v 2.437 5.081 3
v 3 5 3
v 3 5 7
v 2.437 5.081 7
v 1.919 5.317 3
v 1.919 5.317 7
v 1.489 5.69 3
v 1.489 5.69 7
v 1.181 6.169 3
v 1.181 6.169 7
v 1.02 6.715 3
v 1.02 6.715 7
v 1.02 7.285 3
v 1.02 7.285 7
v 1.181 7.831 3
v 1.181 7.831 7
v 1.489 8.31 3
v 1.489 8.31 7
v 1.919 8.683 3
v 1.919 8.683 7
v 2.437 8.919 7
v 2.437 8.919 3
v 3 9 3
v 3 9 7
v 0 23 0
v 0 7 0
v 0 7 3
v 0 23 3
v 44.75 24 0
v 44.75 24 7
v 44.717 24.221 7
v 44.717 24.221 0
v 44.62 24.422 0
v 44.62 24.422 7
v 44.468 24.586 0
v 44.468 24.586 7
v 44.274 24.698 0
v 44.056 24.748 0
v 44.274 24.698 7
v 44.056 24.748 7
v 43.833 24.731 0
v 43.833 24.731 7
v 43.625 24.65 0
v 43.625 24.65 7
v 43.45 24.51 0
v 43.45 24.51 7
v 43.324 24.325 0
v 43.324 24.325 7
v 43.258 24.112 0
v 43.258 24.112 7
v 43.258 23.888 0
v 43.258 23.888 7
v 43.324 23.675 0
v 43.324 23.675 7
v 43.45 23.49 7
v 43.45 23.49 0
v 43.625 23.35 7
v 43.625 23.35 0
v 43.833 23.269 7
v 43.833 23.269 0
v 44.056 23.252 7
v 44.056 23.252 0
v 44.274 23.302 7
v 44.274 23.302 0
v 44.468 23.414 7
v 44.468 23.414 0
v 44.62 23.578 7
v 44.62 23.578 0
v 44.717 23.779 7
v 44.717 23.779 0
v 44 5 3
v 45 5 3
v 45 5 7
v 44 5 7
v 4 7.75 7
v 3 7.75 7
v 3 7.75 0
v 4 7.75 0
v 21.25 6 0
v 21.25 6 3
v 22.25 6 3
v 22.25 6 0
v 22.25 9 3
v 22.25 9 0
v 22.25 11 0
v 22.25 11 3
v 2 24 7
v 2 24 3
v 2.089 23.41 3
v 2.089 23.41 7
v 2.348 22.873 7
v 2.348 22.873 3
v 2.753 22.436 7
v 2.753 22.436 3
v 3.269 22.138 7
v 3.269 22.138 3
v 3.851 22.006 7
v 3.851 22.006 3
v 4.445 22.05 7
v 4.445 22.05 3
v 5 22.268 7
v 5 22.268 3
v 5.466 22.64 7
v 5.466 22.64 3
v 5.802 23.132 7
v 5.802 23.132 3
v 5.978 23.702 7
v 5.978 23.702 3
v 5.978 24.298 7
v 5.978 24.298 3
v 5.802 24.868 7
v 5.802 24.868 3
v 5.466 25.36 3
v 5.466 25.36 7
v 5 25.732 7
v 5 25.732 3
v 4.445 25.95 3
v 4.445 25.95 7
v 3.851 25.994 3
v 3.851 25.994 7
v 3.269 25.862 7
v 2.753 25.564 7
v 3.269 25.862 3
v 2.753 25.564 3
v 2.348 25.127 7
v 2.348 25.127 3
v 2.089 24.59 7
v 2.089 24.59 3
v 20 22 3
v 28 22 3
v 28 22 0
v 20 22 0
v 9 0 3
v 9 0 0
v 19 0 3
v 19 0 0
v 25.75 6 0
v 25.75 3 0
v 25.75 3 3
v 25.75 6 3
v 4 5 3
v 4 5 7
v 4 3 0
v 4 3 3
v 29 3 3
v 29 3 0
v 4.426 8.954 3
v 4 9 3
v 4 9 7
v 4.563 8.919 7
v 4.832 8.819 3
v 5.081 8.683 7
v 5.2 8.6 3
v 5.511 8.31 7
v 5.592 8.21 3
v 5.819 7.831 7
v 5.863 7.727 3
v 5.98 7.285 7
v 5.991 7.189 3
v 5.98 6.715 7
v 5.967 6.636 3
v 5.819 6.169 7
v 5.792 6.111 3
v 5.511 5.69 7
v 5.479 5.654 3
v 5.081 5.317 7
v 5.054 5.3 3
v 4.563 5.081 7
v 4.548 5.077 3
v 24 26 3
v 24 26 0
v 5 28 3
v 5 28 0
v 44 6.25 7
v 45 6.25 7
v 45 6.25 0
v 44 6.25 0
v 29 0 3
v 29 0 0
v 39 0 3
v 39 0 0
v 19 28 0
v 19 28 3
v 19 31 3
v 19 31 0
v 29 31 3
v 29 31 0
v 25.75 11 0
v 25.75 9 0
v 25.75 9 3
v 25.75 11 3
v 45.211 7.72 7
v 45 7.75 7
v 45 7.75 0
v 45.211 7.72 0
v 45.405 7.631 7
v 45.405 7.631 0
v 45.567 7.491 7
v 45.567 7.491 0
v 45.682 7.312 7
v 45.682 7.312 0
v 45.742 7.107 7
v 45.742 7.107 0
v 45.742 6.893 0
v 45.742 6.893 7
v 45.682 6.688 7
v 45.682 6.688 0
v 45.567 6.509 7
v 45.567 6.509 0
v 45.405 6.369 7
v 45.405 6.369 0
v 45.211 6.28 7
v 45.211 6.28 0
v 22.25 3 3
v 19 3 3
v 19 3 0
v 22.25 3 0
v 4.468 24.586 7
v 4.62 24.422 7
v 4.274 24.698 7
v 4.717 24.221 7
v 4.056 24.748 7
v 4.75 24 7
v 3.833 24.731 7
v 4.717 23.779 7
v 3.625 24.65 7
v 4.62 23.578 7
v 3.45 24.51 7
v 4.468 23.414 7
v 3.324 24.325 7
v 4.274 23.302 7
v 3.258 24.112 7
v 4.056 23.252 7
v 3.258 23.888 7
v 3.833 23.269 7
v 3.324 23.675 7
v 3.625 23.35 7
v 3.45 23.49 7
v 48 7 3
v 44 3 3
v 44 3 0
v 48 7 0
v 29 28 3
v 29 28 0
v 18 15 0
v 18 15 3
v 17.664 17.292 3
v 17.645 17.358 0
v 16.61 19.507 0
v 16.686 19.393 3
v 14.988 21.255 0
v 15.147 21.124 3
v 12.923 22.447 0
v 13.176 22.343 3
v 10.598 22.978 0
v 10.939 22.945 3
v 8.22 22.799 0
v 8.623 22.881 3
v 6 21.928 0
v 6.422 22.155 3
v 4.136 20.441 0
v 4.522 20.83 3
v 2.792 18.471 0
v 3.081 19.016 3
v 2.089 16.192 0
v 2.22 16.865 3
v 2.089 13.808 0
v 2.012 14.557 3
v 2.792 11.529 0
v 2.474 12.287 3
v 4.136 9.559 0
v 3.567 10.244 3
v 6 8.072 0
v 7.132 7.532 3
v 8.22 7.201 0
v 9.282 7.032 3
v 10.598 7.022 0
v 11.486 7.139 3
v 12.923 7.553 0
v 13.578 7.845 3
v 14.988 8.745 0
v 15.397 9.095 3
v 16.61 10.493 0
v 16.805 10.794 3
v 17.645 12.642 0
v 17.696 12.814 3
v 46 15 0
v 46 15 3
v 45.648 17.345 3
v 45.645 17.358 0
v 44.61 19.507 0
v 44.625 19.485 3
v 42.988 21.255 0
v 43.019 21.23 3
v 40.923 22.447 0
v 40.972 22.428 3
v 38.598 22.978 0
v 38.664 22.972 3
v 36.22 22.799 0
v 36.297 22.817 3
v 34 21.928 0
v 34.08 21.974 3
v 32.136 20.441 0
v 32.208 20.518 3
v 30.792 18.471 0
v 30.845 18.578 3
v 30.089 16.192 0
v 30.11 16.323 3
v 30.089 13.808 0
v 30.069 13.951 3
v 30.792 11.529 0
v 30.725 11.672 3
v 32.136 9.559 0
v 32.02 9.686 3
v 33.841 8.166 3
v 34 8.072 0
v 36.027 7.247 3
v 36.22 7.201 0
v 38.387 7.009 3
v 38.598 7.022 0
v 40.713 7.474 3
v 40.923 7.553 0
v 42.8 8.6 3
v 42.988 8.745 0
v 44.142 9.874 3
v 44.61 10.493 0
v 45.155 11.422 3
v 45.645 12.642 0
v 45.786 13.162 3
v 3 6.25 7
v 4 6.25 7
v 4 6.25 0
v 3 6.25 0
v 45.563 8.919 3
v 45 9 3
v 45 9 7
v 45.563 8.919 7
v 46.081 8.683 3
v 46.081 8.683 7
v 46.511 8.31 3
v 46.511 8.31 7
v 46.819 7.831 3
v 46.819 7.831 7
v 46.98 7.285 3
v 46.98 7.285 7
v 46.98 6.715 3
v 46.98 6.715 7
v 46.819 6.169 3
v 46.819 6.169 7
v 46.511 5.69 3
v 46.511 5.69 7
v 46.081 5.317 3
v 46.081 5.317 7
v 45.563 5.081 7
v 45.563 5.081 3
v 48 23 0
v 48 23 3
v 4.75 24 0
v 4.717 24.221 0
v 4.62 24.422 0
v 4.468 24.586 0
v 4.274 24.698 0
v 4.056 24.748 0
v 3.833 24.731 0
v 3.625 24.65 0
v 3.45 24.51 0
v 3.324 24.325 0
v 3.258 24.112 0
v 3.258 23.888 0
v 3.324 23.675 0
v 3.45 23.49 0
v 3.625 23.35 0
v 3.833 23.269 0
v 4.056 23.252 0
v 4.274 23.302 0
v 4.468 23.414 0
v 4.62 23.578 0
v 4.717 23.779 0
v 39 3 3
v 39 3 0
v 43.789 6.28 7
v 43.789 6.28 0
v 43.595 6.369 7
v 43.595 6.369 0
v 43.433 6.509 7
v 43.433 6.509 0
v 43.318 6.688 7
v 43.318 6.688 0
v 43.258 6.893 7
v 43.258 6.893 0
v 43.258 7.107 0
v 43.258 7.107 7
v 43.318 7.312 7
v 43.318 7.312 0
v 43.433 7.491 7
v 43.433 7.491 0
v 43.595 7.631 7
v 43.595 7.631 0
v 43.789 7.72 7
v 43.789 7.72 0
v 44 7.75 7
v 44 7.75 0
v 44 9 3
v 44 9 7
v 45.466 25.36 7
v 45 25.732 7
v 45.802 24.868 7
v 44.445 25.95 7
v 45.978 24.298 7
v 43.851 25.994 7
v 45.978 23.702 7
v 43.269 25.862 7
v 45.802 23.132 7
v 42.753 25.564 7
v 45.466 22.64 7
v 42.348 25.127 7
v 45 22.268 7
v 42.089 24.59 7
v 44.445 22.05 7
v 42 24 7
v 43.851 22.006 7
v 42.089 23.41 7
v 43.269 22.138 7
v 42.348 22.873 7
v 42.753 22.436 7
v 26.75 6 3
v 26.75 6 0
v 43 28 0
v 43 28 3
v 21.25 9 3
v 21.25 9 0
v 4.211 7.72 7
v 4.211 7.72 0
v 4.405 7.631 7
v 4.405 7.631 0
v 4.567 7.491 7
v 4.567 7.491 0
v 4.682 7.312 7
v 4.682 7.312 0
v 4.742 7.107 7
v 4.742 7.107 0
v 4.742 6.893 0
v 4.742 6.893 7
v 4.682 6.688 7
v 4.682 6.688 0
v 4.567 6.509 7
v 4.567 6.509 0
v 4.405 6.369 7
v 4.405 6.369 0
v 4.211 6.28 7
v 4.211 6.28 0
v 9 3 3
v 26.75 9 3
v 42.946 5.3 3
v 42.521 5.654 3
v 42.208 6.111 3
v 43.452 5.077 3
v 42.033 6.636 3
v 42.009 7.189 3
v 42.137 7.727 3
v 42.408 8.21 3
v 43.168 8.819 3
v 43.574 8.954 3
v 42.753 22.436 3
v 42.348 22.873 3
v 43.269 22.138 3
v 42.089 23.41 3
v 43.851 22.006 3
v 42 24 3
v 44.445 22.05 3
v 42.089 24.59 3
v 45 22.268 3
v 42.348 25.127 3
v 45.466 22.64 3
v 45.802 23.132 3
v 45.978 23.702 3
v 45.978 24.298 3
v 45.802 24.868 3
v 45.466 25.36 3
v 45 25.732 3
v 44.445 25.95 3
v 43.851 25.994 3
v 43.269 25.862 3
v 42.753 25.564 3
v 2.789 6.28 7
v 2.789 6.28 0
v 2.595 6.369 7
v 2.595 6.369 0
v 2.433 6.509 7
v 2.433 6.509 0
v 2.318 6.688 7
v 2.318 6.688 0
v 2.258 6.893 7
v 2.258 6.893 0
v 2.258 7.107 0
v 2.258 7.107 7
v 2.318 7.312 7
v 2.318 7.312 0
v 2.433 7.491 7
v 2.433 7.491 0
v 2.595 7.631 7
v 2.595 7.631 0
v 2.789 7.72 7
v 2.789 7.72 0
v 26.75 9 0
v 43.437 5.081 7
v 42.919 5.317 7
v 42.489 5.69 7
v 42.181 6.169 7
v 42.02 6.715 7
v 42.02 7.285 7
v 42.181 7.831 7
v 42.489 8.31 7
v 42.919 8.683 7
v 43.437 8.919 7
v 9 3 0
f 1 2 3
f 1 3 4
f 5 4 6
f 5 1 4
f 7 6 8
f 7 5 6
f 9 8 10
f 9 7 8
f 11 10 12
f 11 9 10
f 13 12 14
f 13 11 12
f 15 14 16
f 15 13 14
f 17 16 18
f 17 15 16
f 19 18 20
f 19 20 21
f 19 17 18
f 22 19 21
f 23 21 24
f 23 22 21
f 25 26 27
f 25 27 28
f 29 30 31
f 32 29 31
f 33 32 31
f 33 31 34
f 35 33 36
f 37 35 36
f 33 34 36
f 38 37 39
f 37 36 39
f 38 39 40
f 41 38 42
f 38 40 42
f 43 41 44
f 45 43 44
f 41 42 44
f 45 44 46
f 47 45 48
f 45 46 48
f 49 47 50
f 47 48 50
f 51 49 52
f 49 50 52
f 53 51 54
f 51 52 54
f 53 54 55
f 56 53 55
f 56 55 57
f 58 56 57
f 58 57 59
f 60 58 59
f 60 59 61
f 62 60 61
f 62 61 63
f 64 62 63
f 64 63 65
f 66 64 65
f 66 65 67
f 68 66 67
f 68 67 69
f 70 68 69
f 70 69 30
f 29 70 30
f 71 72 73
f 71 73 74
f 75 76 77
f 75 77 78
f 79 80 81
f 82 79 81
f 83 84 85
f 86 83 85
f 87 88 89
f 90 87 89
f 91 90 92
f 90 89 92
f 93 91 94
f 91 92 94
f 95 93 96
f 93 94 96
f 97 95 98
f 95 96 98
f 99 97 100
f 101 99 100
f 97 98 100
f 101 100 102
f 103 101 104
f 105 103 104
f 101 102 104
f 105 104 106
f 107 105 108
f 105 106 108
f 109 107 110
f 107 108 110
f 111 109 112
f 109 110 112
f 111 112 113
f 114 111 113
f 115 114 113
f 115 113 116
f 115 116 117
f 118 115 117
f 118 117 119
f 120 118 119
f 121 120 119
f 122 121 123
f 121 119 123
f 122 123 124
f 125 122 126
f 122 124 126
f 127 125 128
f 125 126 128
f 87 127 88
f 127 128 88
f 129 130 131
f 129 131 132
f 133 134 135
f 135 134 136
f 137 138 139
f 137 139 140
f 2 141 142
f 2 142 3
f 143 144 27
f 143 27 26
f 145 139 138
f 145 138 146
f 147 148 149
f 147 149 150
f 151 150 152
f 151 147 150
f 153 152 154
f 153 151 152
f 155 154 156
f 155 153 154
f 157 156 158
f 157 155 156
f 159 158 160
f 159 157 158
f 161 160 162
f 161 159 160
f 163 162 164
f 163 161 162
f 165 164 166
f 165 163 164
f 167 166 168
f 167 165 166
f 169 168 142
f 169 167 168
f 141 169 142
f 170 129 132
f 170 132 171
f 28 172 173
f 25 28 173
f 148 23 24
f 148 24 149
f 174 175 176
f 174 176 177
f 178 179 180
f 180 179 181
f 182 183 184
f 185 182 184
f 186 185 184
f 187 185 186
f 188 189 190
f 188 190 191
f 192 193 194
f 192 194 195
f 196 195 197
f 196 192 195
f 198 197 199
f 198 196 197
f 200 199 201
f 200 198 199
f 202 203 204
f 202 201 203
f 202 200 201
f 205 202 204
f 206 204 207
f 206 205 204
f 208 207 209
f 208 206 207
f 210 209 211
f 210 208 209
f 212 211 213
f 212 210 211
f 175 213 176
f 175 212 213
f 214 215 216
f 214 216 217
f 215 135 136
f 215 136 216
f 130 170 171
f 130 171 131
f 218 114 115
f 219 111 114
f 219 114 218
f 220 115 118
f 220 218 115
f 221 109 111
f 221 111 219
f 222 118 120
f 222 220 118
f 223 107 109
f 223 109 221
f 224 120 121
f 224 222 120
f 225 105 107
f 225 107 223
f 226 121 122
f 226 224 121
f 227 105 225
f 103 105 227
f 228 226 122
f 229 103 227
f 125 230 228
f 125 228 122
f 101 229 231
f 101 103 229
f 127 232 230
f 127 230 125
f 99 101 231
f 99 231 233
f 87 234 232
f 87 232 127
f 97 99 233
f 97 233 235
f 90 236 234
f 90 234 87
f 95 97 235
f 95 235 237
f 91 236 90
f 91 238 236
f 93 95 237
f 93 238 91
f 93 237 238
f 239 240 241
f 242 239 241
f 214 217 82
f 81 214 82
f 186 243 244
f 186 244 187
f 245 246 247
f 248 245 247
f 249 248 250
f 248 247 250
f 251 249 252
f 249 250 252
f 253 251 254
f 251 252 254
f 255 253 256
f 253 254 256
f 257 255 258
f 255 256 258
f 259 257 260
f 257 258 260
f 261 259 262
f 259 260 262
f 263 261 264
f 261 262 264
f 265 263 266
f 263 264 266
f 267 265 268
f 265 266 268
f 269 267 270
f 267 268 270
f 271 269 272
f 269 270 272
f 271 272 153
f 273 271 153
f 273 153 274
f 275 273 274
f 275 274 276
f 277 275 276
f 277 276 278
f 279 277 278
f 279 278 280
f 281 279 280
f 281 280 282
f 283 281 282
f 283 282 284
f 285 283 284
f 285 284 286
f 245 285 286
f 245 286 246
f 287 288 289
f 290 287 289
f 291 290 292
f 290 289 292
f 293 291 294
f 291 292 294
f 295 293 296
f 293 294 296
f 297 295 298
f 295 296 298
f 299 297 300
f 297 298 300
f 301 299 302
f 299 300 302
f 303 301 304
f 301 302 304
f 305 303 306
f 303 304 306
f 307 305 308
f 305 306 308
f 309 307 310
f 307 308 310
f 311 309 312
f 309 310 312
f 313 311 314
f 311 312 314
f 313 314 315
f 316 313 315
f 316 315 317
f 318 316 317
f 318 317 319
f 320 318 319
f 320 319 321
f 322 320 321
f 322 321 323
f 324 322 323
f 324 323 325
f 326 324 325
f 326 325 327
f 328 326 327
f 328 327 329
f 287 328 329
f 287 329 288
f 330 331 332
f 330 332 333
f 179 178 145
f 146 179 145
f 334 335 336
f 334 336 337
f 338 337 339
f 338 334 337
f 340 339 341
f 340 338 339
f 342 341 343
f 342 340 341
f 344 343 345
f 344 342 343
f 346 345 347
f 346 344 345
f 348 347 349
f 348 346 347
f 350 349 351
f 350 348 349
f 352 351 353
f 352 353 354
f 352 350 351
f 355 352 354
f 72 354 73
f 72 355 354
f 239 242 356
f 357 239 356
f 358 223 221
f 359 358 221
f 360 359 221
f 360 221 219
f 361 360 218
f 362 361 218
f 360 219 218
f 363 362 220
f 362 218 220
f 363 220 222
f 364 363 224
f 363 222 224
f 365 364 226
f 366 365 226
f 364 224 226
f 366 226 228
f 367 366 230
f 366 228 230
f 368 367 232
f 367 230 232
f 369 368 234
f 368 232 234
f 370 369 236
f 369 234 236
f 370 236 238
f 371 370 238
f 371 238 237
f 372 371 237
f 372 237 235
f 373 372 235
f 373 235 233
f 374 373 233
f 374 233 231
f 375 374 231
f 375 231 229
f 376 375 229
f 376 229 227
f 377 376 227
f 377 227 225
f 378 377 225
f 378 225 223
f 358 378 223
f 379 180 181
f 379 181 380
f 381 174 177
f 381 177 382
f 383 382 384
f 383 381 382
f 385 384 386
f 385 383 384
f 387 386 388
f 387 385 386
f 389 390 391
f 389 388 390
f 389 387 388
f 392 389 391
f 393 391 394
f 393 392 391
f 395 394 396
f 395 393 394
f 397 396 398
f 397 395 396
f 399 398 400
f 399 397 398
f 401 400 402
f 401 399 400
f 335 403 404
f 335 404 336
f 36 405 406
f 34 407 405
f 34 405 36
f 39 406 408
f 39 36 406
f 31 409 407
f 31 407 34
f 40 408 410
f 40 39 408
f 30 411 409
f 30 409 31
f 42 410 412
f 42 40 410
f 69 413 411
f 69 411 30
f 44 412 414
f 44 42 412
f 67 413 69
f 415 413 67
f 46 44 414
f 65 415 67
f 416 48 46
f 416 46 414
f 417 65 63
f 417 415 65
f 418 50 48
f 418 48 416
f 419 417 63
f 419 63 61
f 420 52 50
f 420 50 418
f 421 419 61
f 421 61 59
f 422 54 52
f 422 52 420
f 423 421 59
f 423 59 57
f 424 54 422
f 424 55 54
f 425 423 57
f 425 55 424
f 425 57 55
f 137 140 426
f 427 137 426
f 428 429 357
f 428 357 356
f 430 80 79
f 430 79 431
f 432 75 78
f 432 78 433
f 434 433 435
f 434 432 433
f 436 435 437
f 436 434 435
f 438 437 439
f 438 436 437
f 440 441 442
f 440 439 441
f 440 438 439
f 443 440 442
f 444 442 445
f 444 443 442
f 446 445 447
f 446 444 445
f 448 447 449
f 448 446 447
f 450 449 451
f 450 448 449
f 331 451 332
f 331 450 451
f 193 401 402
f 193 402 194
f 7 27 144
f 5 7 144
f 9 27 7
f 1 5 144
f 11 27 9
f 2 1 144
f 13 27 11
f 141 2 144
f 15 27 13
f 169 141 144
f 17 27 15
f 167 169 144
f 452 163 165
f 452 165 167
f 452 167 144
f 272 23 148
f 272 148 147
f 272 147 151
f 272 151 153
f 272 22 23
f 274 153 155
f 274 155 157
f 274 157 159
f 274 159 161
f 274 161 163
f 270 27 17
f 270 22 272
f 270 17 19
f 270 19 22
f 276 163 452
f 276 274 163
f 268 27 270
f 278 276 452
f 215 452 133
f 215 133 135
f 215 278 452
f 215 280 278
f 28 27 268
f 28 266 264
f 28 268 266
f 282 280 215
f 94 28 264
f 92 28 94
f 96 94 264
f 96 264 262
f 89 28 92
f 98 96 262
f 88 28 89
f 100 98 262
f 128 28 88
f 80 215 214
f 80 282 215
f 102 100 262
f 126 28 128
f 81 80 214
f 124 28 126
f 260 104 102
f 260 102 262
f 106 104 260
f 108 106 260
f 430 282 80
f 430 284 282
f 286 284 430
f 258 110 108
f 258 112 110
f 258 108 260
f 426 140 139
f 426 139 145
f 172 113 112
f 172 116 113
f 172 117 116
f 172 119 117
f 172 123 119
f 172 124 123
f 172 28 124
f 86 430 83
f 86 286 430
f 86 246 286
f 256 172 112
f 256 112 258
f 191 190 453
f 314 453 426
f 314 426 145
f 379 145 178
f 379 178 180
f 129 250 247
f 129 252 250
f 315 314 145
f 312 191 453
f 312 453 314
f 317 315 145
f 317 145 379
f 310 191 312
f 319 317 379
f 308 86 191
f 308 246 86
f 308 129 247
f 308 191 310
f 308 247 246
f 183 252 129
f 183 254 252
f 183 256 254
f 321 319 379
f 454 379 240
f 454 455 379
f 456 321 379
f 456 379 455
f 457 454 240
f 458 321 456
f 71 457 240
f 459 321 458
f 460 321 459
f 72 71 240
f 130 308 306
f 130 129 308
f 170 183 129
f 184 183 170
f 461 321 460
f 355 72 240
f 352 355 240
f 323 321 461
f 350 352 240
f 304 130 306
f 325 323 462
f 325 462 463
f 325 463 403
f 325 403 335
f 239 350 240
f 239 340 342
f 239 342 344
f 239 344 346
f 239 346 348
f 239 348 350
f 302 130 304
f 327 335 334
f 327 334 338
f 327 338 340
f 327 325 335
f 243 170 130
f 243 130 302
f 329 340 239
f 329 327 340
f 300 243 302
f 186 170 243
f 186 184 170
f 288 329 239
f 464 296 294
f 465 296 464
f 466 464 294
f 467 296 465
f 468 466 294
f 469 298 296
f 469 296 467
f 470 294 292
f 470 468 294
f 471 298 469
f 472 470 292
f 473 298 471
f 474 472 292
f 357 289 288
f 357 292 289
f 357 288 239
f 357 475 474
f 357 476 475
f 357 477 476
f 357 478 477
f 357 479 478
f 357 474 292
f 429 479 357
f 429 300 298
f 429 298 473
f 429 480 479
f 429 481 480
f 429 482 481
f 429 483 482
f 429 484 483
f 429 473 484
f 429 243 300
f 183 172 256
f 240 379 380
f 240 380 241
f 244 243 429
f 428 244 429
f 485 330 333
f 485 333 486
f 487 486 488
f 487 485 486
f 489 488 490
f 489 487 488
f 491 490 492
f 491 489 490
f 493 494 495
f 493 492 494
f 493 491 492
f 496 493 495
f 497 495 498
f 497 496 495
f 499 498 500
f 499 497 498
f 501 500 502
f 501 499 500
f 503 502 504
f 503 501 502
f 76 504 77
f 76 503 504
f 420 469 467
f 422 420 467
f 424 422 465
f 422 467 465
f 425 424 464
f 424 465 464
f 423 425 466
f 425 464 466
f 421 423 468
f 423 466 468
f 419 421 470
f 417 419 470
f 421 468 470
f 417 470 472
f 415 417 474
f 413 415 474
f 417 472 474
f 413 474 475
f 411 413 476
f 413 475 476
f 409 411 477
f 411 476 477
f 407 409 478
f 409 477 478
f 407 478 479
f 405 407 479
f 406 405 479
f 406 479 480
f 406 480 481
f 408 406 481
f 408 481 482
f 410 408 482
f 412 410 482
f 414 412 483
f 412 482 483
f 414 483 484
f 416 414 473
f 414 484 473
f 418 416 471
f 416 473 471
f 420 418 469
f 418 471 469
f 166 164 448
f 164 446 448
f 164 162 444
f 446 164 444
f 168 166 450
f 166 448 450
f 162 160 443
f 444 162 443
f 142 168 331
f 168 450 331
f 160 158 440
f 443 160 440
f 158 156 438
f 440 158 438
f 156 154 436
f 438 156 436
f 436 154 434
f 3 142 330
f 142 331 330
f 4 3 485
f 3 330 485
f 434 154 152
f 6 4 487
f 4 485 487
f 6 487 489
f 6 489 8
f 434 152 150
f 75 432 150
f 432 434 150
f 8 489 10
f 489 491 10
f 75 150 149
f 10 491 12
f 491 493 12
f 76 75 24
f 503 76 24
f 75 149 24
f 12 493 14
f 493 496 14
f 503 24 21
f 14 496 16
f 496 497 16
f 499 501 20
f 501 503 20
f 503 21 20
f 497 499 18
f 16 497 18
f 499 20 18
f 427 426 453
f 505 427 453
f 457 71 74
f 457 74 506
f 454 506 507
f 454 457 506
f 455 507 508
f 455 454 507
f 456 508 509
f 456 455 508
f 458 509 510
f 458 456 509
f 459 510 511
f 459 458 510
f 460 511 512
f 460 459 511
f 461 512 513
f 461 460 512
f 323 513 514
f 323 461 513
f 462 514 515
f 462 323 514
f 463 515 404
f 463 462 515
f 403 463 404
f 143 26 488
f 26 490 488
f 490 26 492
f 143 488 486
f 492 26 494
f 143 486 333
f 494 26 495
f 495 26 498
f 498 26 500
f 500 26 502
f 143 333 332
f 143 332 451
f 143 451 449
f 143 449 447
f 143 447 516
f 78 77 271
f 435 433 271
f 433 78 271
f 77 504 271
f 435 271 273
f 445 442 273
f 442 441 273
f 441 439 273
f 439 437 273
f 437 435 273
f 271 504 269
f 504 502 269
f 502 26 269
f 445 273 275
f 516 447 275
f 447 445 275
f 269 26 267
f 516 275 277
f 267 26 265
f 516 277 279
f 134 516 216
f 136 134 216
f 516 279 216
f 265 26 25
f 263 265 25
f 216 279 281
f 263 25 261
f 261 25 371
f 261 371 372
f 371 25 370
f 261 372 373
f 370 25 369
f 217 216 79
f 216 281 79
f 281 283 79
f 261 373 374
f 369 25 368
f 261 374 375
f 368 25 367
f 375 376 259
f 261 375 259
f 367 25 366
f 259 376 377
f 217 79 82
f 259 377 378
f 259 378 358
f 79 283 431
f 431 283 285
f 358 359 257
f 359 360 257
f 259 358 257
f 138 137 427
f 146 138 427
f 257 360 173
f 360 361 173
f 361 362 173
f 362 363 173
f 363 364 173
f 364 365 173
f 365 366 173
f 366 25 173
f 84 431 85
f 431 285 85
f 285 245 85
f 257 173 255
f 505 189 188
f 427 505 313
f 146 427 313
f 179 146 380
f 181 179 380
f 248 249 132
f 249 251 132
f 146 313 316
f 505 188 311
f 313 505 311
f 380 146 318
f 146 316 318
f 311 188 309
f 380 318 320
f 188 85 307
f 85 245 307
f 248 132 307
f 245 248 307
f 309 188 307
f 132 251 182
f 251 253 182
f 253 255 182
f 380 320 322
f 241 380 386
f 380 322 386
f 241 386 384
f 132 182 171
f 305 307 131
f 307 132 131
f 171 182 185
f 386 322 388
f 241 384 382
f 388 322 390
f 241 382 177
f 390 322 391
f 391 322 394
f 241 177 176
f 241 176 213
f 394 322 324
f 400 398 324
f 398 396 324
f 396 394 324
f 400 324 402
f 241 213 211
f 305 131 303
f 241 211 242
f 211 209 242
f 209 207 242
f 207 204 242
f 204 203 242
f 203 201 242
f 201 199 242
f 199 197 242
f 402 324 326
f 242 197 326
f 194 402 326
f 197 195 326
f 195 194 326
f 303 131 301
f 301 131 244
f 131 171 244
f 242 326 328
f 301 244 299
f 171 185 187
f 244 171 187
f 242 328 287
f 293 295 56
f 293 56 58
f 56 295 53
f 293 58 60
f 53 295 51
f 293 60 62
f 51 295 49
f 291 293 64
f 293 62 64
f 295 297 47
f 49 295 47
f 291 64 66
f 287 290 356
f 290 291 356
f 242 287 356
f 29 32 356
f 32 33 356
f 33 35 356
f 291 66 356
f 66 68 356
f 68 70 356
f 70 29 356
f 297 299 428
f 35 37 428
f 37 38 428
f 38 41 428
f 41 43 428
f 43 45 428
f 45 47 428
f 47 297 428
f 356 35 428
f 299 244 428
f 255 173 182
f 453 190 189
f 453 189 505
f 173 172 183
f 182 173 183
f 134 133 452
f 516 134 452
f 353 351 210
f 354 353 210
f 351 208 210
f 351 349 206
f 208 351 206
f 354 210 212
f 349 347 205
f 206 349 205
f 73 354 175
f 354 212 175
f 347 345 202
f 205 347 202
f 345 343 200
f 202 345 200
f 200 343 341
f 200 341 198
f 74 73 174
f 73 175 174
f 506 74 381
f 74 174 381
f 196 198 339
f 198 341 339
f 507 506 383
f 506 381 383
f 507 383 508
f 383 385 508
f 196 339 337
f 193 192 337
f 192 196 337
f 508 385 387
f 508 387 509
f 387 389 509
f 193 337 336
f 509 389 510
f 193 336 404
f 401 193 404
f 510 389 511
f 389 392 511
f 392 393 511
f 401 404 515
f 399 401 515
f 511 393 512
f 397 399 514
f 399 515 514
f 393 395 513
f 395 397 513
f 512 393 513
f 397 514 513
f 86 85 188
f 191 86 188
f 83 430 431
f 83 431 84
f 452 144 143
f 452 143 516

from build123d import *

# Parameters (mm, degrees)
ESQUISSE1_W              = 48
ESQUISSE1_H              = 31
BOSS_EXTRU_1_DEPTH       = 3
ENL_V_MAT_EXTRU_2_REACH  = 59.219
ESQUISSE3_W              = 10
ESQUISSE3_H              = 3
ENL_V_MAT_EXTRU_3_REACH  = 59.219
ESQUISSE4_W              = 5.5
ESQUISSE4_H              = 3
ENL_V_START              = -3
ESQUISSE5_W              = 3.5
ESQUISSE5_H              = 11
ENL_V_MAT_EXTRU_4_DEPTH  = 3
ENL_V_MAT_EXTRU_7_REACH  = 59.219
ESQUISSE8_W              = 5
ESQUISSE8_H              = 3
ENL_V_MAT_EXTRU_8_REACH  = 59.219
ESQUISSE9_W              = 5
ESQUISSE9_H              = 3
ENL_V_MAT_EXTRU_14_REACH = 59.219
ESQUISSE18_W             = 4
ESQUISSE18_H             = 3
ENL_V_MAT_EXTRU_19_REACH = 59.219
ESQUISSE23_W             = 4
ESQUISSE23_H             = 3
ENL_V_MAT_EXTRU_20_REACH = 59.219
ENL_V_MAT_EXTRU_21_REACH = 59.219
ESQUISSE25_W             = 19
ESQUISSE25_H             = 3
ENL_V_MAT_EXTRU_22_REACH = 59.219
ESQUISSE26_W             = 19
ESQUISSE26_H             = 3
ENL_V_MAT_EXTRU_23_REACH = 59.219
ESQUISSE27_R             = 8
ENL_V_MAT_EXTRU_24_REACH = 59.219
ESQUISSE28_R             = 8
ESQUISSE29_R             = 2
BOSS_EXTRU_5_DEPTH       = 4
ESQUISSE30_R             = 2
BOSS_EXTRU_6_DEPTH       = 4
ENL_V_MAT_EXTRU_25_REACH = 59.567
ESQUISSE31_R             = 0.75
ENL_V_MAT_EXTRU_26_REACH = 59.567
ESQUISSE32_R             = 0.75
BOSS_EXTRU_7_DEPTH       = 4
BOSS_EXTRU_8_DEPTH       = 4
ENL_V_MAT_EXTRU_27_REACH = 59.567
ENL_V_MAT_EXTRU_29_REACH = 59.567
CHANFREIN4_SIZE          = 5
CHANFREIN5_SIZE          = 4


with BuildPart() as part:
    # Esquisse1 → Boss.-Extru.1 (new body)
    with BuildSketch(Plane.XY):
        with Locations((24, 15.5)):
            Rectangle(ESQUISSE1_W, ESQUISSE1_H)
    extrude(amount=BOSS_EXTRU_1_DEPTH)

    # Esquisse3 → Enlèv. mat.-Extru.2 (cut, up to next)
    with BuildSketch(Plane.XY.offset(3), mode=Mode.PRIVATE) as enl_v_mat_extru_2_sk1:
        with Locations((24, 1.5)):
            Rectangle(ESQUISSE3_W, ESQUISSE3_H)
    enl_v_mat_extru_2_tool1 = extrude(enl_v_mat_extru_2_sk1.sketch, amount=-ENL_V_MAT_EXTRU_2_REACH, mode=Mode.PRIVATE) & part.part
    add(enl_v_mat_extru_2_tool1.solids().sort_by_distance((24, 1.5, 3))[0], mode=Mode.SUBTRACT)

    # Esquisse4 → Enlèv. mat.-Extru.3 (cut, up to next)
    with BuildSketch(Plane.XY.offset(3), mode=Mode.PRIVATE) as enl_v_mat_extru_3_sk1:
        with Locations((24, 7.5)):
            Rectangle(ESQUISSE4_W, ESQUISSE4_H)
    enl_v_mat_extru_3_tool1 = extrude(enl_v_mat_extru_3_sk1.sketch, amount=-ENL_V_MAT_EXTRU_3_REACH, mode=Mode.PRIVATE) & part.part
    add(enl_v_mat_extru_3_tool1.solids().sort_by_distance((24, 7.5, 3))[0], mode=Mode.SUBTRACT)

    # Esquisse5 → Enlèv. mat.-Extru.4 (cut)
    with BuildSketch(Plane.XY.offset(3).offset(ENL_V_START)):
        with Locations((24, 5.5)):
            Rectangle(ESQUISSE5_W, ESQUISSE5_H)
    extrude(amount=ENL_V_MAT_EXTRU_4_DEPTH, mode=Mode.SUBTRACT)

    # Esquisse8 → Enlèv. mat.-Extru.7 (cut, up to next)
    with BuildSketch(Plane.XY.offset(3), mode=Mode.PRIVATE) as enl_v_mat_extru_7_sk1:
        with Locations((2.5, 1.5)):
            Rectangle(ESQUISSE8_W, ESQUISSE8_H)
    enl_v_mat_extru_7_tool1 = extrude(enl_v_mat_extru_7_sk1.sketch, amount=-ENL_V_MAT_EXTRU_7_REACH, mode=Mode.PRIVATE) & part.part
    add(enl_v_mat_extru_7_tool1.solids().sort_by_distance((2.5, 1.5, 3))[0], mode=Mode.SUBTRACT)

    # Esquisse9 → Enlèv. mat.-Extru.8 (cut, up to next)
    with BuildSketch(Plane.XY.offset(3), mode=Mode.PRIVATE) as enl_v_mat_extru_8_sk1:
        with Locations((45.5, 1.5)):
            Rectangle(ESQUISSE9_W, ESQUISSE9_H)
    enl_v_mat_extru_8_tool1 = extrude(enl_v_mat_extru_8_sk1.sketch, amount=-ENL_V_MAT_EXTRU_8_REACH, mode=Mode.PRIVATE) & part.part
    add(enl_v_mat_extru_8_tool1.solids().sort_by_distance((45.5, 1.5, 3))[0], mode=Mode.SUBTRACT)

    # Esquisse18 → Enlèv. mat.-Extru.14 (cut, up to next)
    with BuildSketch(Plane.XY.offset(3), mode=Mode.PRIVATE) as enl_v_mat_extru_14_sk1:
        with Locations((41, 1.5)):
            Rectangle(ESQUISSE18_W, ESQUISSE18_H)
    enl_v_mat_extru_14_tool1 = extrude(enl_v_mat_extru_14_sk1.sketch, amount=-ENL_V_MAT_EXTRU_14_REACH, mode=Mode.PRIVATE) & part.part
    add(enl_v_mat_extru_14_tool1.solids().sort_by_distance((41, 1.5, 3))[0], mode=Mode.SUBTRACT)

    # Esquisse23 → Enlèv. mat.-Extru.19 (cut, up to next)
    with BuildSketch(Plane.XY.offset(3), mode=Mode.PRIVATE) as enl_v_mat_extru_19_sk1:
        with Locations((7, 1.5)):
            Rectangle(ESQUISSE23_W, ESQUISSE23_H)
    enl_v_mat_extru_19_tool1 = extrude(enl_v_mat_extru_19_sk1.sketch, amount=-ENL_V_MAT_EXTRU_19_REACH, mode=Mode.PRIVATE) & part.part
    add(enl_v_mat_extru_19_tool1.solids().sort_by_distance((7, 1.5, 3))[0], mode=Mode.SUBTRACT)

    # Esquisse24 → Enlèv. mat.-Extru.20 (cut, up to next)
    with BuildSketch(Plane.XY.offset(3), mode=Mode.PRIVATE) as enl_v_mat_extru_20_sk1:
        Polygon((20, 22), (24, 26), (28, 22), align=None)
    enl_v_mat_extru_20_tool1 = extrude(enl_v_mat_extru_20_sk1.sketch, amount=-ENL_V_MAT_EXTRU_20_REACH, mode=Mode.PRIVATE) & part.part
    add(enl_v_mat_extru_20_tool1.solids().sort_by_distance((24, 23.333333, 3))[0], mode=Mode.SUBTRACT)

    # Esquisse25 → Enlèv. mat.-Extru.21 (cut, up to next)
    with BuildSketch(Plane.XY.offset(3), mode=Mode.PRIVATE) as enl_v_mat_extru_21_sk1:
        with Locations((38.5, 29.5)):
            Rectangle(ESQUISSE25_W, ESQUISSE25_H)
    enl_v_mat_extru_21_tool1 = extrude(enl_v_mat_extru_21_sk1.sketch, amount=-ENL_V_MAT_EXTRU_21_REACH, mode=Mode.PRIVATE) & part.part
    add(enl_v_mat_extru_21_tool1.solids().sort_by_distance((38.5, 29.5, 3))[0], mode=Mode.SUBTRACT)

    # Esquisse26 → Enlèv. mat.-Extru.22 (cut, up to next)
    with BuildSketch(Plane.XY.offset(3), mode=Mode.PRIVATE) as enl_v_mat_extru_22_sk1:
        with Locations((9.5, 29.5)):
            Rectangle(ESQUISSE26_W, ESQUISSE26_H)
    enl_v_mat_extru_22_tool1 = extrude(enl_v_mat_extru_22_sk1.sketch, amount=-ENL_V_MAT_EXTRU_22_REACH, mode=Mode.PRIVATE) & part.part
    add(enl_v_mat_extru_22_tool1.solids().sort_by_distance((9.5, 29.5, 3))[0], mode=Mode.SUBTRACT)

    # Esquisse27 → Enlèv. mat.-Extru.23 (cut, up to next)
    with BuildSketch(Plane.XY.offset(3), mode=Mode.PRIVATE) as enl_v_mat_extru_23_sk1:
        with Locations((38, 15)):
            Circle(ESQUISSE27_R)
    enl_v_mat_extru_23_tool1 = extrude(enl_v_mat_extru_23_sk1.sketch, amount=-ENL_V_MAT_EXTRU_23_REACH, mode=Mode.PRIVATE) & part.part
    add(enl_v_mat_extru_23_tool1.solids().sort_by_distance((38, 15, 3))[0], mode=Mode.SUBTRACT)

    # Esquisse28 → Enlèv. mat.-Extru.24 (cut, up to next)
    with BuildSketch(Plane.XY.offset(3), mode=Mode.PRIVATE) as enl_v_mat_extru_24_sk1:
        with Locations((10, 15)):
            Circle(ESQUISSE28_R)
    enl_v_mat_extru_24_tool1 = extrude(enl_v_mat_extru_24_sk1.sketch, amount=-ENL_V_MAT_EXTRU_24_REACH, mode=Mode.PRIVATE) & part.part
    add(enl_v_mat_extru_24_tool1.solids().sort_by_distance((10, 15, 3))[0], mode=Mode.SUBTRACT)

    # Esquisse29 → Boss.-Extru.5 (add)
    with BuildSketch(Plane.XY.offset(3)):
        with Locations(Location((4, 24, 0), (0, 0, 180))):
            Circle(ESQUISSE29_R)
    extrude(amount=BOSS_EXTRU_5_DEPTH)

    # Esquisse30 → Boss.-Extru.6 (add)
    with BuildSketch(Plane.XY.offset(3)):
        with Locations(Location((44, 24, 0), (0, 0, 180))):
            Circle(ESQUISSE30_R)
    extrude(amount=BOSS_EXTRU_6_DEPTH)

    # Esquisse31 → Enlèv. mat.-Extru.25 (cut, up to next)
    with BuildSketch(Plane.XY.offset(7), mode=Mode.PRIVATE) as enl_v_mat_extru_25_sk1:
        with Locations((4, 24)):
            Circle(ESQUISSE31_R)
    enl_v_mat_extru_25_tool1 = extrude(enl_v_mat_extru_25_sk1.sketch, amount=-ENL_V_MAT_EXTRU_25_REACH, mode=Mode.PRIVATE) & part.part
    add(enl_v_mat_extru_25_tool1.solids().sort_by_distance((4, 24, 7))[0], mode=Mode.SUBTRACT)

    # Esquisse32 → Enlèv. mat.-Extru.26 (cut, up to next)
    with BuildSketch(Plane.XY.offset(7), mode=Mode.PRIVATE) as enl_v_mat_extru_26_sk1:
        with Locations((44, 24)):
            Circle(ESQUISSE32_R)
    enl_v_mat_extru_26_tool1 = extrude(enl_v_mat_extru_26_sk1.sketch, amount=-ENL_V_MAT_EXTRU_26_REACH, mode=Mode.PRIVATE) & part.part
    add(enl_v_mat_extru_26_tool1.solids().sort_by_distance((44, 24, 7))[0], mode=Mode.SUBTRACT)

    # Esquisse33 → Boss.-Extru.7 (add)
    with BuildSketch(Plane.XY.offset(3)):
        with BuildLine():
            Line((3, 9), (4, 9))
            ThreePointArc((4, 9), (6, 7), (4, 5))
            Line((4, 5), (3, 5))
            ThreePointArc((3, 5), (1, 7), (3, 9))
        make_face()
    extrude(amount=BOSS_EXTRU_7_DEPTH)

    # Esquisse34 → Boss.-Extru.8 (add)
    with BuildSketch(Plane.XY.offset(3)):
        with BuildLine():
            Line((44, 9), (45, 9))
            ThreePointArc((45, 9), (47, 7), (45, 5))
            Line((45, 5), (44, 5))
            ThreePointArc((44, 5), (42, 7), (44, 9))
        make_face()
    extrude(amount=BOSS_EXTRU_8_DEPTH)

    # Esquisse35 → Enlèv. mat.-Extru.27 (cut, up to next)
    with BuildSketch(Plane.XY.offset(7), mode=Mode.PRIVATE) as enl_v_mat_extru_27_sk1:
        with BuildLine():
            Line((3, 7.75), (4, 7.75))
            ThreePointArc((4, 7.75), (4.75, 7), (4, 6.25))
            Line((4, 6.25), (3, 6.25))
            ThreePointArc((3, 6.25), (2.25, 7), (3, 7.75))
        make_face()
    enl_v_mat_extru_27_tool1 = extrude(enl_v_mat_extru_27_sk1.sketch, amount=-ENL_V_MAT_EXTRU_27_REACH, mode=Mode.PRIVATE) & part.part
    add(enl_v_mat_extru_27_tool1.solids().sort_by_distance((3.5, 7, 7))[0], mode=Mode.SUBTRACT)

    # Esquisse37 → Enlèv. mat.-Extru.29 (cut, up to next)
    with BuildSketch(Plane.XY.offset(7), mode=Mode.PRIVATE) as enl_v_mat_extru_29_sk1:
        with BuildLine():
            Line((44, 7.75), (45, 7.75))
            ThreePointArc((45, 7.75), (45.75, 7), (45, 6.25))
            Line((45, 6.25), (44, 6.25))
            ThreePointArc((44, 6.25), (43.25, 7), (44, 7.75))
        make_face()
    enl_v_mat_extru_29_tool1 = extrude(enl_v_mat_extru_29_sk1.sketch, amount=-ENL_V_MAT_EXTRU_29_REACH, mode=Mode.PRIVATE) & part.part
    add(enl_v_mat_extru_29_tool1.solids().sort_by_distance((44.5, 7, 7))[0], mode=Mode.SUBTRACT)

    # Chanfrein4
    chanfrein4_edges = [part.edges().sort_by_distance(p)[0] for p in [
        (48, 28, 1.5),
        (0, 28, 1.5),
    ]]
    chamfer(chanfrein4_edges, length=CHANFREIN4_SIZE)

    # Chanfrein5
    chanfrein5_edges = [part.edges().sort_by_distance(p)[0] for p in [
        (0, 3, 1.5),
        (48, 3, 1.5),
    ]]
    chamfer(chanfrein5_edges, length=CHANFREIN5_SIZE)


solid = part.part
